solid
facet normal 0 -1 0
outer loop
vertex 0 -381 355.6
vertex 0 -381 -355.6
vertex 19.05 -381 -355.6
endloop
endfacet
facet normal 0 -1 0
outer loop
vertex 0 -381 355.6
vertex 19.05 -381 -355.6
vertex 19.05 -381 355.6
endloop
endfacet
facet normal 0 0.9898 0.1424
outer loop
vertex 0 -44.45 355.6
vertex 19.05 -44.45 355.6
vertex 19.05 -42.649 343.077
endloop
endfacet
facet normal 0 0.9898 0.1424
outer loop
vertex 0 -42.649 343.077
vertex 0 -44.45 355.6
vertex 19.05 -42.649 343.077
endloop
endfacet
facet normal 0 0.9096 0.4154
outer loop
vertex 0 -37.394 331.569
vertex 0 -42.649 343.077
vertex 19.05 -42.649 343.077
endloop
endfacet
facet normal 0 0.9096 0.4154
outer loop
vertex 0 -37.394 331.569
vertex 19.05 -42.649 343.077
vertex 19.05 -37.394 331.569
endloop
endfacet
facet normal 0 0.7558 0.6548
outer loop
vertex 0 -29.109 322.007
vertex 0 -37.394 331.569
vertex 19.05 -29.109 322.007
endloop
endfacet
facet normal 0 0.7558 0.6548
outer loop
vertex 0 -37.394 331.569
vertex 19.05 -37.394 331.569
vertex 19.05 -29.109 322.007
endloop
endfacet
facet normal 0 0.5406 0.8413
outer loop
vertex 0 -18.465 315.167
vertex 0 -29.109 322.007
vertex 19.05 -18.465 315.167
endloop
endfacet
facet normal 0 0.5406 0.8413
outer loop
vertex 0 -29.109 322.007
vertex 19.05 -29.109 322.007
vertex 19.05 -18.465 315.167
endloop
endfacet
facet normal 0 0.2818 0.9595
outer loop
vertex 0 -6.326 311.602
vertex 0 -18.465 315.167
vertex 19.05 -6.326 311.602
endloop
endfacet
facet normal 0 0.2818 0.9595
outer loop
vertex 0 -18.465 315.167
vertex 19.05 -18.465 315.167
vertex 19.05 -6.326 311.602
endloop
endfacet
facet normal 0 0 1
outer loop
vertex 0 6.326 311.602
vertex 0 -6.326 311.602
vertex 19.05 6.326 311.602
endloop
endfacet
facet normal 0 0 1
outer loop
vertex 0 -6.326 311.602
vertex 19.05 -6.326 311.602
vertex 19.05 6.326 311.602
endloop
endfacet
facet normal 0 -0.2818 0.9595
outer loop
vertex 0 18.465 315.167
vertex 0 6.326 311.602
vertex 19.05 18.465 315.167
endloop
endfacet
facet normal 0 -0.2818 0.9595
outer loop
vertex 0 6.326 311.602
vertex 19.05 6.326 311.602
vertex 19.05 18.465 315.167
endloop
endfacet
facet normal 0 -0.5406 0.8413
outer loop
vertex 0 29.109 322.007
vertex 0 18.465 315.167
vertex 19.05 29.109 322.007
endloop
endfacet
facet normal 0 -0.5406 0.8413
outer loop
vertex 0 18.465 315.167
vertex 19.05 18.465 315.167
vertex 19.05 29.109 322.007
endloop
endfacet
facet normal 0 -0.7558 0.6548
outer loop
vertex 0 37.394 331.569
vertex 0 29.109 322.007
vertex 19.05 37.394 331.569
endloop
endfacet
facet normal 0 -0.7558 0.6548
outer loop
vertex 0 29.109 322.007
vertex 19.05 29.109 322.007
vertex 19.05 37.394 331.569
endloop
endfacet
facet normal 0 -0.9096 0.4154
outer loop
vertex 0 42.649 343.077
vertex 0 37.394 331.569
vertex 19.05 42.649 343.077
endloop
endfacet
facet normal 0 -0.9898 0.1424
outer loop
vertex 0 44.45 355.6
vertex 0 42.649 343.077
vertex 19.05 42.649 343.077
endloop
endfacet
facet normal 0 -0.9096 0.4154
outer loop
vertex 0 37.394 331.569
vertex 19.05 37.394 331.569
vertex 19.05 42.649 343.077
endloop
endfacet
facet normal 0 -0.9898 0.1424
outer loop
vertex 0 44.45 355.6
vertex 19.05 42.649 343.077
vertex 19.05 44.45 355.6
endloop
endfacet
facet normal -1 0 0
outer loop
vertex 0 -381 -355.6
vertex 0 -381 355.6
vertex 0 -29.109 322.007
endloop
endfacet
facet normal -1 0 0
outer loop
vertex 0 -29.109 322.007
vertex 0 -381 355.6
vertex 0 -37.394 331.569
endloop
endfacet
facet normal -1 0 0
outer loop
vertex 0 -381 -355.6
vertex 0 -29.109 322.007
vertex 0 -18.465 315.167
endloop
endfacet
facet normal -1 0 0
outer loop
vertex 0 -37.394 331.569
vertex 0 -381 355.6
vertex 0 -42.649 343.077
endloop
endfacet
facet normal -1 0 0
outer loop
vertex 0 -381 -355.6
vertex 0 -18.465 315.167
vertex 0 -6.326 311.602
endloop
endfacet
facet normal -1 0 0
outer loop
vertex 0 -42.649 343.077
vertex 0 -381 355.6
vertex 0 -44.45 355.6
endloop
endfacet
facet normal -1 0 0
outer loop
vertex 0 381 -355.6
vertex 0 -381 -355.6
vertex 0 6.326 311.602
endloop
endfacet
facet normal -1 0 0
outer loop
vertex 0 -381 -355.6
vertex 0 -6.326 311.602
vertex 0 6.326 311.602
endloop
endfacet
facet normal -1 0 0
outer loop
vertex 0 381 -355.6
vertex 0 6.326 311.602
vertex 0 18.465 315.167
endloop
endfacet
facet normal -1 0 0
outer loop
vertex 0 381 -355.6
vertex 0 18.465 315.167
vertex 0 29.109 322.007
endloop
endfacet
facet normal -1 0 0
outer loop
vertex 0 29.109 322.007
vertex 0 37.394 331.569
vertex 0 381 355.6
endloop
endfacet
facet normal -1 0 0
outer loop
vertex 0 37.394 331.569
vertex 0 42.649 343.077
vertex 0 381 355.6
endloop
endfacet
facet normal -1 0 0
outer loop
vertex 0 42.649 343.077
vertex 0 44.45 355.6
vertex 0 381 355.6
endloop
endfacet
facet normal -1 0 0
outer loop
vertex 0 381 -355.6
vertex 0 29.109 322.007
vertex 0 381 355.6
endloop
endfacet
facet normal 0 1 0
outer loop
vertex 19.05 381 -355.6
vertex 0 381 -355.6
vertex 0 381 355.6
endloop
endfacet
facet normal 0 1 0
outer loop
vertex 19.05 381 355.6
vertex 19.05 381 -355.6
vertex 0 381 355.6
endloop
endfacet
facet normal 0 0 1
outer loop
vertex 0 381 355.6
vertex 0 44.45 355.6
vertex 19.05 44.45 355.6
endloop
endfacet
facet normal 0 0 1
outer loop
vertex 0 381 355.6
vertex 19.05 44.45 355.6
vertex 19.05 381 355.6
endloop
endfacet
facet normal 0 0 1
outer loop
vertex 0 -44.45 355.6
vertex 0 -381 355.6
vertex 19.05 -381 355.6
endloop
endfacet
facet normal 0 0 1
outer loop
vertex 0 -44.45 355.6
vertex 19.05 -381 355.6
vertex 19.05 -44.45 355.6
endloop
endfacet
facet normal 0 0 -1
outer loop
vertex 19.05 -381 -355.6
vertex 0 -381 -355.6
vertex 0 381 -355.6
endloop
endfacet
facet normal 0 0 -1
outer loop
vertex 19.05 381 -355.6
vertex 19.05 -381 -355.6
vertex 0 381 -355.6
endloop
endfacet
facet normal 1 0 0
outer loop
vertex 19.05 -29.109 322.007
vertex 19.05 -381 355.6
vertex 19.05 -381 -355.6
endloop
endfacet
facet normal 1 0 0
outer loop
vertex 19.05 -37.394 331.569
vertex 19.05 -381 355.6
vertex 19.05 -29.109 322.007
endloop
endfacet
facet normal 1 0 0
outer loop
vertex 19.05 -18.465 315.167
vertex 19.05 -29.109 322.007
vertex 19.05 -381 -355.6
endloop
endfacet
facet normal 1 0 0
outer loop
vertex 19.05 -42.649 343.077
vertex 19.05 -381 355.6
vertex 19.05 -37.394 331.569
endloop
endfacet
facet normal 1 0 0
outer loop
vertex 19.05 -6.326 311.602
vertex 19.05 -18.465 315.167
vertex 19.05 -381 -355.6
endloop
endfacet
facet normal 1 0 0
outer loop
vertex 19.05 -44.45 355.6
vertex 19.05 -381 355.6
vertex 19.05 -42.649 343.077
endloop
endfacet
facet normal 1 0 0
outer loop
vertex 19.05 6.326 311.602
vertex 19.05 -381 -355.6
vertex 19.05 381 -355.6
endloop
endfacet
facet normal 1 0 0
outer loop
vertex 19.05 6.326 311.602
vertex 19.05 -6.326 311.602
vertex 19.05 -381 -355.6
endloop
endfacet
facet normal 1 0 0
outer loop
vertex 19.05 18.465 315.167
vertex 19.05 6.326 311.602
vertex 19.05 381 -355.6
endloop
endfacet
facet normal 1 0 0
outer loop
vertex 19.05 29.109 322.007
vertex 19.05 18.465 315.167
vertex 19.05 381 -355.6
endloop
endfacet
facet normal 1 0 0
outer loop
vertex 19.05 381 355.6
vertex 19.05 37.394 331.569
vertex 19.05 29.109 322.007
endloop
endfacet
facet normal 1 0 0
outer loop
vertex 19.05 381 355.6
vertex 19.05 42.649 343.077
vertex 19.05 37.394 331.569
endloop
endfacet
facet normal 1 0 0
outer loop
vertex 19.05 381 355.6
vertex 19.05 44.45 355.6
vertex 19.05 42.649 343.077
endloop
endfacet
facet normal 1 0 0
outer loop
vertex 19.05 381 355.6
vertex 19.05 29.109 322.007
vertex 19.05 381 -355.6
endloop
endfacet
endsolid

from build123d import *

# Parameters (mm, degrees)
F0_W     = 762
F0_H     = 711.2
F1_DEPTH = 19.05
F3_DEPTH = 25.4


with BuildPart() as f1:
    # F0 (on Right) → F1 (new body)
    with BuildSketch(Plane.YZ):
        Rectangle(F0_W, F0_H)
    extrude(amount=F1_DEPTH)

    # F2 (on face) → F3 (cut)
    with BuildSketch(Plane.YZ.offset(19.05)):
        with BuildLine():
            ThreePointArc((-44.45, 355.6), (0, 311.15), (44.45, 355.6))
            Line((44.45, 355.6), (-44.45, 355.6))
        make_face()
    extrude(amount=-F3_DEPTH, mode=Mode.SUBTRACT)


solid = f1.part
